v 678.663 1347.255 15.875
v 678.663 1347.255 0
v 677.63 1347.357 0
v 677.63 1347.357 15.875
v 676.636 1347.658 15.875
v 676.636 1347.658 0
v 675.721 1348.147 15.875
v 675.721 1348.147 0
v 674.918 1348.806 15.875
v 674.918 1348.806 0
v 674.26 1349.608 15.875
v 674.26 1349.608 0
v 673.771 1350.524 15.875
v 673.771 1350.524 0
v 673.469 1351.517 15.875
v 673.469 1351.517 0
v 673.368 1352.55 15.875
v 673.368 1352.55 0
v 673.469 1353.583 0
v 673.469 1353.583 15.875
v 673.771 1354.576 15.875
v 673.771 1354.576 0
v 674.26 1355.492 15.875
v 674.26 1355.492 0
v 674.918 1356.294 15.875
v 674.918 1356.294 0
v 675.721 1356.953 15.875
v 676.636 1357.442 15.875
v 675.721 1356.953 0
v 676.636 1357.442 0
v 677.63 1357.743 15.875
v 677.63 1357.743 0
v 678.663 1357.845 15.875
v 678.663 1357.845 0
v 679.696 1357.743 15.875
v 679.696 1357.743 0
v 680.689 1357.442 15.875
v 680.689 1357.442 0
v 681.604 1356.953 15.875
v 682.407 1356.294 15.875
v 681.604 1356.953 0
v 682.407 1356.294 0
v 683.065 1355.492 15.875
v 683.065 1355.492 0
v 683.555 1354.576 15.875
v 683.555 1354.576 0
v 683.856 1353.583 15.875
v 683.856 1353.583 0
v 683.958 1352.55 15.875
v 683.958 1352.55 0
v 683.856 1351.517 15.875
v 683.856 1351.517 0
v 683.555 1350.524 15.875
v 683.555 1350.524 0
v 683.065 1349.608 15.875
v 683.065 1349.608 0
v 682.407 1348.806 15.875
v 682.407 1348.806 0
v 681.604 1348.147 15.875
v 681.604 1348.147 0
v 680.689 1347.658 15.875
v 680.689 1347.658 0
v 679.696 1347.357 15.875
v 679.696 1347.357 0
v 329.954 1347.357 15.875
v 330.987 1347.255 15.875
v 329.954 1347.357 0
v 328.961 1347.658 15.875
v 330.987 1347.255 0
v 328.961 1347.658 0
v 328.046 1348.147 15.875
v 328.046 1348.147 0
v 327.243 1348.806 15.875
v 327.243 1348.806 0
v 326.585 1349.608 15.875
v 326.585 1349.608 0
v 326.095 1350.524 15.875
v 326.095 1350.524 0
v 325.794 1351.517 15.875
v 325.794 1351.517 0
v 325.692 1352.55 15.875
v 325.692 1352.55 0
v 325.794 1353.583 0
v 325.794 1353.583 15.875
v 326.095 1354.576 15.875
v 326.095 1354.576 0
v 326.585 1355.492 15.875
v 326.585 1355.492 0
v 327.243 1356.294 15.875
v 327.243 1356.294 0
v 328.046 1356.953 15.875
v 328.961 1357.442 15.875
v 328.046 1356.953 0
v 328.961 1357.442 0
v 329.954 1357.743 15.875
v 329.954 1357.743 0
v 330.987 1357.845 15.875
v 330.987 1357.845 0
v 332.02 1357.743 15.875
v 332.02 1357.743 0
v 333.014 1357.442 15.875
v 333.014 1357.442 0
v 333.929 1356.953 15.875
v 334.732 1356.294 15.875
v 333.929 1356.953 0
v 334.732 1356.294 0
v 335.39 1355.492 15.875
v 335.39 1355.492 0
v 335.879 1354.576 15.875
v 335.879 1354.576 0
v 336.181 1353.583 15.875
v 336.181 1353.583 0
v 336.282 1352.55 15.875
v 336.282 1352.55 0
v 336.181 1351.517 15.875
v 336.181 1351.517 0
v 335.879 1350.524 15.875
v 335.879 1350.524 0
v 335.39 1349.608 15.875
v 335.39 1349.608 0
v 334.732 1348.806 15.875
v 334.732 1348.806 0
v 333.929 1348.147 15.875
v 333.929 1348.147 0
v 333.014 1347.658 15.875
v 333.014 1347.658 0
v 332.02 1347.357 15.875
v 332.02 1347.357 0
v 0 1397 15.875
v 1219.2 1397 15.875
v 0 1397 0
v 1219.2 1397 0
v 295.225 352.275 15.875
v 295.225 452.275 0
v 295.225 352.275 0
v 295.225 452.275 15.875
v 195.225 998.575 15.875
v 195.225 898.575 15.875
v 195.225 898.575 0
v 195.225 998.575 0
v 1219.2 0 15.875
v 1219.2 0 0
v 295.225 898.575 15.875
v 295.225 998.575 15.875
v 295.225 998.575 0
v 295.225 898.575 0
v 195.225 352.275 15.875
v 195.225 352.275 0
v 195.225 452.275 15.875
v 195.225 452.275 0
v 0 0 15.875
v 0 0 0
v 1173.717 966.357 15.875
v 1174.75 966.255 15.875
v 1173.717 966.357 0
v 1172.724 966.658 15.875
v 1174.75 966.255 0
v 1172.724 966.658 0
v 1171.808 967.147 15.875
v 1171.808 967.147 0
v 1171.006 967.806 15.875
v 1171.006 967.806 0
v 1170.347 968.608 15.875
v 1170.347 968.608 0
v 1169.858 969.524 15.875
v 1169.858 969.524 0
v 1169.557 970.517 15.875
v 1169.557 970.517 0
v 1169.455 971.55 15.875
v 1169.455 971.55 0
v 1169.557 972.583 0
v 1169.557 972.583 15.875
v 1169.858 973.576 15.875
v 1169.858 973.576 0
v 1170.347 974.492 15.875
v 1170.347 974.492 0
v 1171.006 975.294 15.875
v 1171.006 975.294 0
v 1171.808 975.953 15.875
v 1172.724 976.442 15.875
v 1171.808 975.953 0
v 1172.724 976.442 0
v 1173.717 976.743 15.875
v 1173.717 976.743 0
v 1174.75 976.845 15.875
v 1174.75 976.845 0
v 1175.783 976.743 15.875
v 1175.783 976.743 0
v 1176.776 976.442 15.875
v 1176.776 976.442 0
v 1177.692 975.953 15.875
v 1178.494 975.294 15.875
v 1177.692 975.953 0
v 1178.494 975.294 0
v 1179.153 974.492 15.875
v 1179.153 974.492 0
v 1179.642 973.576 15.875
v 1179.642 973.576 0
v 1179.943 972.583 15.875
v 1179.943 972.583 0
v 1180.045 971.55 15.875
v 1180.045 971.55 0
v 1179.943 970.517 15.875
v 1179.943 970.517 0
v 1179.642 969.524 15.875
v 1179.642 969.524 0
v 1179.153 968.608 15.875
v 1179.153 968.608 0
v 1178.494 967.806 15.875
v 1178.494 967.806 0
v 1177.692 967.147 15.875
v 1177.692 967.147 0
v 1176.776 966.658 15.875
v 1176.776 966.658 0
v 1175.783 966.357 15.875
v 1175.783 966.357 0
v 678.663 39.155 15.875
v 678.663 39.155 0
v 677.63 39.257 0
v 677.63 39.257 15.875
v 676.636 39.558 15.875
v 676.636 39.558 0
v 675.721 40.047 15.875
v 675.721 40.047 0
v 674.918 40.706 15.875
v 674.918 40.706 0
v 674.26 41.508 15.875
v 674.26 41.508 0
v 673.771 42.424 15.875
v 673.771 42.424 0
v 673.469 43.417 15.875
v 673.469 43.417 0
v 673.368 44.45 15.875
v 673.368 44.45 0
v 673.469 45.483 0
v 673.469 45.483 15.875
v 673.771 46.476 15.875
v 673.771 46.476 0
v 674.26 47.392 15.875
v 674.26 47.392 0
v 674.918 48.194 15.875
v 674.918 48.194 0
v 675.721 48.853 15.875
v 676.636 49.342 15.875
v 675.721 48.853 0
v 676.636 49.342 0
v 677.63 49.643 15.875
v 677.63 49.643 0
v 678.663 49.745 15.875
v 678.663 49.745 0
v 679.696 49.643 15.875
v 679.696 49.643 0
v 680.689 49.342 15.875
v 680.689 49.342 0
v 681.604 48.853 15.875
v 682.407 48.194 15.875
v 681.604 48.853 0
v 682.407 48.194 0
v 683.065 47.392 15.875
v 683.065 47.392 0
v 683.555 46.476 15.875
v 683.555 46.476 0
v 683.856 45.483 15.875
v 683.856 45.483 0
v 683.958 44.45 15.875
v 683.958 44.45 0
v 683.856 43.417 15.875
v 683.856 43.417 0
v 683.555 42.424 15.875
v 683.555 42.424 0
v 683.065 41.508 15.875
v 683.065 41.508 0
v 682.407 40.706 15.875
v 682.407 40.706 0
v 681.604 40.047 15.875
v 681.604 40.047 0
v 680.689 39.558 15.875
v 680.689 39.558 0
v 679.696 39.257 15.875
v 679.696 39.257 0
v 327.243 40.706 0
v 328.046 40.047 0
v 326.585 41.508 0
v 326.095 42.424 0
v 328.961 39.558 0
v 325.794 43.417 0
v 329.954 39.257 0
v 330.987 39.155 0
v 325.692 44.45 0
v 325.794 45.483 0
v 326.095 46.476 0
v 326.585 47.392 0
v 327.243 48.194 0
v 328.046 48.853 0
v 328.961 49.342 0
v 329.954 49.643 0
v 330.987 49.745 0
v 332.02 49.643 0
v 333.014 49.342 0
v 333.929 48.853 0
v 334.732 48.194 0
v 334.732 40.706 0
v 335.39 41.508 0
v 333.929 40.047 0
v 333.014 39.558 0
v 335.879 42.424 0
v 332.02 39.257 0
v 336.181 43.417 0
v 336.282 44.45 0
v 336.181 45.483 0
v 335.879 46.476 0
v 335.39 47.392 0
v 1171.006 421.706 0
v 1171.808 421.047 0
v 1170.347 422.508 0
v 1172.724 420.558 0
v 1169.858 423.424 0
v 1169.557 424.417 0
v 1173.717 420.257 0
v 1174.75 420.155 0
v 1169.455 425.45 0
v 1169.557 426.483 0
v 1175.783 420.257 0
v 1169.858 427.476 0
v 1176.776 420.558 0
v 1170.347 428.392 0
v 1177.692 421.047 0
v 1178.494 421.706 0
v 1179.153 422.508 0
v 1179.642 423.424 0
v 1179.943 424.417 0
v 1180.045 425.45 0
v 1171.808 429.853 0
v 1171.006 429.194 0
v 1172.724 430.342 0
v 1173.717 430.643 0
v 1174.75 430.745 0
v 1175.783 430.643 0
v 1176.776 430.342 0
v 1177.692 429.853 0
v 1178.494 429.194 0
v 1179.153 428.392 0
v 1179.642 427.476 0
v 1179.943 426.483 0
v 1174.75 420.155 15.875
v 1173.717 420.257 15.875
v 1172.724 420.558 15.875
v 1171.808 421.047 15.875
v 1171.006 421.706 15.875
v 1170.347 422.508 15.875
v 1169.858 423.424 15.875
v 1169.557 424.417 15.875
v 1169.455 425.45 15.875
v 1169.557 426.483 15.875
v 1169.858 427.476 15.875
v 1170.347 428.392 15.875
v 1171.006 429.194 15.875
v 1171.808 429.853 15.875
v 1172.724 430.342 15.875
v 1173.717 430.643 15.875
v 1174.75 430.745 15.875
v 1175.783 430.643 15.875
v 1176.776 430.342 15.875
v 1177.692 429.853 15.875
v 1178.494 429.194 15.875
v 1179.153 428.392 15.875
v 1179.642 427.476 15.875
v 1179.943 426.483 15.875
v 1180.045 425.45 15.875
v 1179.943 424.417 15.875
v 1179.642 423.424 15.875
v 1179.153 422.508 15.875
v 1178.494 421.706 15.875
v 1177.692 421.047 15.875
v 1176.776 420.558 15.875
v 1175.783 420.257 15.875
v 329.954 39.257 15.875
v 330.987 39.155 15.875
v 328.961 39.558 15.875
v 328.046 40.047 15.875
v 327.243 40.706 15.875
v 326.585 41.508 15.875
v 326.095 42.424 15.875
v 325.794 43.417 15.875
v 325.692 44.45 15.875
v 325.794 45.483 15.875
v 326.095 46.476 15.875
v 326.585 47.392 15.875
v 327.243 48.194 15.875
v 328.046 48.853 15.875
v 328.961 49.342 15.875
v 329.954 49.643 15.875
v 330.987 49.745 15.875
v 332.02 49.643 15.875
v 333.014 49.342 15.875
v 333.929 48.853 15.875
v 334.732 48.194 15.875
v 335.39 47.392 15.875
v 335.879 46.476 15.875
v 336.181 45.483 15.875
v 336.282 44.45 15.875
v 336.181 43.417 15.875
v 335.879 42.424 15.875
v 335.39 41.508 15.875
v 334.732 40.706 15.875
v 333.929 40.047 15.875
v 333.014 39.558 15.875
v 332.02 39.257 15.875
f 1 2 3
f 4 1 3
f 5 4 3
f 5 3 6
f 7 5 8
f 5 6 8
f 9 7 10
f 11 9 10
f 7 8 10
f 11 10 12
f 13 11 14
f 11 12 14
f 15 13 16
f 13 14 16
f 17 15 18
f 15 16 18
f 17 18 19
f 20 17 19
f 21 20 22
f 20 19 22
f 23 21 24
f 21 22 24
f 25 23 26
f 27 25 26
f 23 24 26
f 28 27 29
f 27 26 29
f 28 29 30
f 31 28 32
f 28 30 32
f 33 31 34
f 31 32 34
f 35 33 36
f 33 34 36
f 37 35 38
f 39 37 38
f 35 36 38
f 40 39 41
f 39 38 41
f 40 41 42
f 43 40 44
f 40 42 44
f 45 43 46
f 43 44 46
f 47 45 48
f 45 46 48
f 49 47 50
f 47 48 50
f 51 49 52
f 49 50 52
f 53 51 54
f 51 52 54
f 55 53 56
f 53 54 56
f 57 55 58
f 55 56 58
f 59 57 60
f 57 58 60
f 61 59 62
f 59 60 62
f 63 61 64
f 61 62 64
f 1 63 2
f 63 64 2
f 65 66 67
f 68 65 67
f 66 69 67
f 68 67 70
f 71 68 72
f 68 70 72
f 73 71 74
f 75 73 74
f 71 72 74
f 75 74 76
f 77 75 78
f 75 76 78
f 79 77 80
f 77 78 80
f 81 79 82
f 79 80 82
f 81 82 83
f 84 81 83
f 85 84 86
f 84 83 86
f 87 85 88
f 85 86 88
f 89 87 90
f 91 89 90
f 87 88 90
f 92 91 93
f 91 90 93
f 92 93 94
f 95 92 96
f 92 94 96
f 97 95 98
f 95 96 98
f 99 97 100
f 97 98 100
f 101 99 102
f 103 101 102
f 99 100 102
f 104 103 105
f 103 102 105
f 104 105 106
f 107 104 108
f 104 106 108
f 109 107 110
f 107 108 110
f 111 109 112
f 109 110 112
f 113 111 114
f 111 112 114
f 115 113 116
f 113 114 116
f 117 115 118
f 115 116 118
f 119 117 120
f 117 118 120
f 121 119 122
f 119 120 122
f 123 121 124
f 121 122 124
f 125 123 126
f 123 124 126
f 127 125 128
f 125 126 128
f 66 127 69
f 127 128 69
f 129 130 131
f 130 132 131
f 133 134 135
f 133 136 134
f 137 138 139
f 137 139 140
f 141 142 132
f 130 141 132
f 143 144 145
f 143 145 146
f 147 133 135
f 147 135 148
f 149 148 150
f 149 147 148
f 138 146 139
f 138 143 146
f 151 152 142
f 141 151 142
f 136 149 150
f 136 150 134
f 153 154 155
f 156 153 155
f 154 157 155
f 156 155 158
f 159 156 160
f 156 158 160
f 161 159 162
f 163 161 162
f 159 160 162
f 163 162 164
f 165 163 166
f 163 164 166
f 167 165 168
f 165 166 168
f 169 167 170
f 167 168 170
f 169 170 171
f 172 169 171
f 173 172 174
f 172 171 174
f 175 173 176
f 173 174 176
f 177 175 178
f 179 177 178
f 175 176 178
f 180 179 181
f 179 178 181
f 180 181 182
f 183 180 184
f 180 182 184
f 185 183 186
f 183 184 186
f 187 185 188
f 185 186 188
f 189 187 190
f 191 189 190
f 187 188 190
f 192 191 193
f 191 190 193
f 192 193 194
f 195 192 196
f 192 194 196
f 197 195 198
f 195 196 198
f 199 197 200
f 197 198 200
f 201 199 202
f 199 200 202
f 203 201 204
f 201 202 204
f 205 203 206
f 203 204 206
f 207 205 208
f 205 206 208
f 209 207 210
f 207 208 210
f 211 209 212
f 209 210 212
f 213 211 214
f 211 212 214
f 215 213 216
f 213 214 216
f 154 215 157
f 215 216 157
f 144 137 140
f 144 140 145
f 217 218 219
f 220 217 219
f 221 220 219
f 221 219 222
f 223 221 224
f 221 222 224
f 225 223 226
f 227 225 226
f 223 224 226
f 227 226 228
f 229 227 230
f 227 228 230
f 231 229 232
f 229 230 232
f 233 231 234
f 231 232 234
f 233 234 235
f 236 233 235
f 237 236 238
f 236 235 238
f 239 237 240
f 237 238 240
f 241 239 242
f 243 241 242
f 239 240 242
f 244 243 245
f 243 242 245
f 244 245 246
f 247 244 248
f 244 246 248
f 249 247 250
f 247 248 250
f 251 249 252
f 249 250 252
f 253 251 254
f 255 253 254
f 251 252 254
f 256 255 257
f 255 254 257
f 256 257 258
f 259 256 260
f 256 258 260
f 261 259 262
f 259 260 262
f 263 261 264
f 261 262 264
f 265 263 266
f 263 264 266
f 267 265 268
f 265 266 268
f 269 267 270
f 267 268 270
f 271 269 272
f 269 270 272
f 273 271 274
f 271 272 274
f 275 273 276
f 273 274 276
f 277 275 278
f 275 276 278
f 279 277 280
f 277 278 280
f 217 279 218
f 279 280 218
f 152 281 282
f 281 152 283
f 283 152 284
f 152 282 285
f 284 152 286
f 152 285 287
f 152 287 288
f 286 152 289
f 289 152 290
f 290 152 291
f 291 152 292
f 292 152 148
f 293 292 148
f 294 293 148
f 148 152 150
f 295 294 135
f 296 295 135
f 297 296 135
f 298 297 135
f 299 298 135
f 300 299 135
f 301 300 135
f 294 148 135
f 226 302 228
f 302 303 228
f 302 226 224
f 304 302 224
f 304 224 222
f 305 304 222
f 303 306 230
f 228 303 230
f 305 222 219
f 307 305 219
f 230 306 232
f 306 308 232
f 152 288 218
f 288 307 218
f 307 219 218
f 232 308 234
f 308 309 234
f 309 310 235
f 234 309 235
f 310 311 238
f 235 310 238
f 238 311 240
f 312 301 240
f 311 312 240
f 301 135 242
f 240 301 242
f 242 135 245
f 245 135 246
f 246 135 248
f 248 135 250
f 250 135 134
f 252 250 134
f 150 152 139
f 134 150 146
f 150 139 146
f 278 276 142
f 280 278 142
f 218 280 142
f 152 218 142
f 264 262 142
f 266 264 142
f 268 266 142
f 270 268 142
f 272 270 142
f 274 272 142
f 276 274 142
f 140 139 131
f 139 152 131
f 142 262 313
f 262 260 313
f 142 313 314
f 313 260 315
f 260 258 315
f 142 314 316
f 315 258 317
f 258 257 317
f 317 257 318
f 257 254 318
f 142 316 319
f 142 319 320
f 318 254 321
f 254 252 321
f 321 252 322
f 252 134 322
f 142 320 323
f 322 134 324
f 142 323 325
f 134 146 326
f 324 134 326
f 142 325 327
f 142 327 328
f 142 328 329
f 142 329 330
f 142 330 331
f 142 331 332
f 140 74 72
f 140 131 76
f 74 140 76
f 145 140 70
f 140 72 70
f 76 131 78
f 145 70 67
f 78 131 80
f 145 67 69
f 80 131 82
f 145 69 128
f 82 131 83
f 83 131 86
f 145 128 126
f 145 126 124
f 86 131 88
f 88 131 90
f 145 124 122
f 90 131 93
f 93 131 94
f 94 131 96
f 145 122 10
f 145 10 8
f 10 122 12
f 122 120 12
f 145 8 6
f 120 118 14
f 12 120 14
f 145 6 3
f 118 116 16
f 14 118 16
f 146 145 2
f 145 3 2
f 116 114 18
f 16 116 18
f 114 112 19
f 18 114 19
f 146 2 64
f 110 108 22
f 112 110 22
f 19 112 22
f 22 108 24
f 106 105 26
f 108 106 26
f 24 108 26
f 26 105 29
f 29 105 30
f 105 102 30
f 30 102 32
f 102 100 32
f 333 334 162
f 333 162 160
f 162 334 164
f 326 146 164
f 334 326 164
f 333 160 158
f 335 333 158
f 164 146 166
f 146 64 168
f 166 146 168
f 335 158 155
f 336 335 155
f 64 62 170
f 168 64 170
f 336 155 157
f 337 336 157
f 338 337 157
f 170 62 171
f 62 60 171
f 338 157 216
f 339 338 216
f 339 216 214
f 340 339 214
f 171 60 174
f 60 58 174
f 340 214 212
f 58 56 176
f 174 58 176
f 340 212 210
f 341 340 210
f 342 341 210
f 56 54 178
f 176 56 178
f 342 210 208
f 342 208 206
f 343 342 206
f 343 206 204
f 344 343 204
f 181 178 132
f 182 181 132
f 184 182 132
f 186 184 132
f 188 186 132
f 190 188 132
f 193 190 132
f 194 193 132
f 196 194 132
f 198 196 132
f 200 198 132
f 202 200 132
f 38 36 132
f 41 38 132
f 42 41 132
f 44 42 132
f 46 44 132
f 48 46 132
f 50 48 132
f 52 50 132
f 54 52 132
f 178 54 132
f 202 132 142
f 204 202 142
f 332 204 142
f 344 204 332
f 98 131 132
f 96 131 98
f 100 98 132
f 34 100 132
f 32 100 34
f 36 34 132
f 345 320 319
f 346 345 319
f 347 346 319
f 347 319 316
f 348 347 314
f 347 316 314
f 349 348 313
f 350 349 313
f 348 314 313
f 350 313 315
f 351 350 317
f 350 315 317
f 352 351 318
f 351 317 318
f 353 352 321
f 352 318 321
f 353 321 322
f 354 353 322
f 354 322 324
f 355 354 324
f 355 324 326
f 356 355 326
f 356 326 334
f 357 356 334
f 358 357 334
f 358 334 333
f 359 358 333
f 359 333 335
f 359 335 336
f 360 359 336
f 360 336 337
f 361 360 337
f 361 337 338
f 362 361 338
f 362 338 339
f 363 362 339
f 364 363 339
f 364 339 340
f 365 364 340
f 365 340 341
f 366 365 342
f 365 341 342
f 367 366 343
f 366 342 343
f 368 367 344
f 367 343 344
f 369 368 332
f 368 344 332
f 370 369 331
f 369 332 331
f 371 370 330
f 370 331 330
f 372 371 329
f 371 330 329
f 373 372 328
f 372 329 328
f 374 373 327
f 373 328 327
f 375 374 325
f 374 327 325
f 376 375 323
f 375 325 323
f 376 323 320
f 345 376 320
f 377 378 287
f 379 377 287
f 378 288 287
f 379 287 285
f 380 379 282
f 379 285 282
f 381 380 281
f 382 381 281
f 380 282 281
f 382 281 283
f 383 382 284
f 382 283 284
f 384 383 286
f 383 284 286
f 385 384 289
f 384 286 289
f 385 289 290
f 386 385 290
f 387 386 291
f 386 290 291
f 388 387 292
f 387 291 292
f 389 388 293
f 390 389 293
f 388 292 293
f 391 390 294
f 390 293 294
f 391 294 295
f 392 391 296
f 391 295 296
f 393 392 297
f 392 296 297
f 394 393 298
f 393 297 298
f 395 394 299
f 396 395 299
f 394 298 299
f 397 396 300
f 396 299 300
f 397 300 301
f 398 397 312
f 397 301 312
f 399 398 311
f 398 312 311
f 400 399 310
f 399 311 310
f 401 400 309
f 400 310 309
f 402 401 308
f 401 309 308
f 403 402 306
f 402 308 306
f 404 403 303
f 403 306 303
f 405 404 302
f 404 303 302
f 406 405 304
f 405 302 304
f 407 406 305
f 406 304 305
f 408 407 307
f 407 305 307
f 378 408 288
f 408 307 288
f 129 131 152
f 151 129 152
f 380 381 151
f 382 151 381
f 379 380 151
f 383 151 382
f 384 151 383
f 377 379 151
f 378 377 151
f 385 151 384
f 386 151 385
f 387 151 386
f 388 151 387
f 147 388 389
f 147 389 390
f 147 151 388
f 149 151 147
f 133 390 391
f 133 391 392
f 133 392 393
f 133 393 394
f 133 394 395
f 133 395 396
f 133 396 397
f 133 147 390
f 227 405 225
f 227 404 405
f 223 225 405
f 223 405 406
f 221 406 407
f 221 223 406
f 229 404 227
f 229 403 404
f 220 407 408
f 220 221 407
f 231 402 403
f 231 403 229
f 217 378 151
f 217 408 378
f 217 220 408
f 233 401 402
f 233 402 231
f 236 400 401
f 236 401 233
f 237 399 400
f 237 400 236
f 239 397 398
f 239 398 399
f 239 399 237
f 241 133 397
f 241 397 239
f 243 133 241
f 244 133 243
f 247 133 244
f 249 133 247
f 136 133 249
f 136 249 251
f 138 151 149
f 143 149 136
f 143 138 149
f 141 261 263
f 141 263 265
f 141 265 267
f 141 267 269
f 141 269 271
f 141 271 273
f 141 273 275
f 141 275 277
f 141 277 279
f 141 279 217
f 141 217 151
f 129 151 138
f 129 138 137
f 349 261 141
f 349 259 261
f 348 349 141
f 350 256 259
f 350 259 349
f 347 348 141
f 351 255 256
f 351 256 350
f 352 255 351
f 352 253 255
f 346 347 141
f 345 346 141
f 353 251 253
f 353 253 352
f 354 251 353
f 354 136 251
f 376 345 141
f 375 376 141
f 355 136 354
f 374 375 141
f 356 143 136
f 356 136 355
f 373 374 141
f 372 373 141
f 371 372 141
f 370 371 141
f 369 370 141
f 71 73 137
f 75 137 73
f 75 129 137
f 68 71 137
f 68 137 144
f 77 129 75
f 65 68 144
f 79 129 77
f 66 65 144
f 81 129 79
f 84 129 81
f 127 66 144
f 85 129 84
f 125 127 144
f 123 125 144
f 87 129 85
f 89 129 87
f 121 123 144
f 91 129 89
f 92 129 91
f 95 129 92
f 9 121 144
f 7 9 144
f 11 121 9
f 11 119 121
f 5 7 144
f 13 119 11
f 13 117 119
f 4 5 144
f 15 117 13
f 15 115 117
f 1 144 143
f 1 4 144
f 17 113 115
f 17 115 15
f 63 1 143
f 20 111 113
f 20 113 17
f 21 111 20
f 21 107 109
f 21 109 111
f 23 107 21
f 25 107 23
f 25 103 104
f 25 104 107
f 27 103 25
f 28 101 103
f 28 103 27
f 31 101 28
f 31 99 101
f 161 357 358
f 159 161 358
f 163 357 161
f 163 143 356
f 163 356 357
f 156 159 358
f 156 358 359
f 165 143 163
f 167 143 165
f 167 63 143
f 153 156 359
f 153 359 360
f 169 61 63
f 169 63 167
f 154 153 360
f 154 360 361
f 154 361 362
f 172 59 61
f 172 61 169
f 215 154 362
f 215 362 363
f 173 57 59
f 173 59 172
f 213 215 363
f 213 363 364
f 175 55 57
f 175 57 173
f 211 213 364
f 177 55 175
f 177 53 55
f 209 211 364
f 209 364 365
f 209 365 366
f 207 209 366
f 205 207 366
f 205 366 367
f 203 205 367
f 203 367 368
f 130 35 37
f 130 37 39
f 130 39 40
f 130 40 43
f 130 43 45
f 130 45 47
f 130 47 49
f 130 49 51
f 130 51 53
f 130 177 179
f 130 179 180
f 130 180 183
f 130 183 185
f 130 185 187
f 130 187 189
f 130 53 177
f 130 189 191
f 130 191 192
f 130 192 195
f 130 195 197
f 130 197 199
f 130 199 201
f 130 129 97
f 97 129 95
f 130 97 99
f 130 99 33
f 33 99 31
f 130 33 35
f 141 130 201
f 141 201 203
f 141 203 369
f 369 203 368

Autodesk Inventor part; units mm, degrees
ref_plane "YZ Plane" through (0, 0, 0) normal (1, 0, 0) x (0, 1, 0)
ref_plane "XZ Plane" through (0, 0, 0) normal (0, 1, 0) x (-1, 0, 0)
ref_plane "XY Plane" through (0, 0, 0) normal (0, 0, 1) x (1, 0, 0)
sketch "Sketch1" plane through (0, 0, 0) normal (0, 0, 1) x (1, 0, 0)
  line L0 (0, 0) -> (1219.2, 0)
  line L1 (1219.2, 0) -> (1219.2, 1397)
  line L2 (1219.2, 1397) -> (0, 1397)
  line L3 (0, 1397) -> (0, 0)
  dimension "d0" = 1219.2
  dimension "d1" = 1397
extrude "Extrusion1" add sketch "Sketch1" along normal blind 15.875
sketch "Sketch8" plane through (0, 0, 15.875) normal (0, 0, 1) x (1, 0, 0)
  line L0 (1219.2, 0) -> (1219.2, 1397) projected
  point P0 (330.9874, 1352.55)
  point P1 (678.6626, 1352.55)
  point P2 (1174.75, 971.55)
  point P3 (1174.75, 425.45)
  point P4 (678.6626, 44.45)
  point P5 (330.9874, 44.45)
  point P6 (330.9874, 1352.55)
  point P7 (678.6626, 1352.55)
  point P8 (1174.75, 971.55)
  point P9 (1174.75, 425.45)
  point P10 (678.6626, 44.45)
  point P11 (330.9874, 44.45)
hole "Hole4" at (330.9874, 1352.55, 15.875) at (678.6626, 1352.55, 15.875) at (1174.75, 971.55, 15.875) at (1174.75, 425.45, 15.875) at (678.6626, 44.45, 15.875) at (330.9874, 44.45, 15.875) direction (0, 0, -1) diameter 10.59 end through all thread size "1/2-13 UNC" class "2B" standard "ANSI Unified Screw Threads"
sketch "Sketch14" plane through (0, 0, 15.875) normal (0, 0, 1) x (1, 0, 0)
  line L0 (1219.2, 0) -> (1219.2, 1397) projected
  line L1 (1219.2, 0) -> (1219.2, 88.9)
  line L2 (1219.2, 88.9) -> (1130.3, 88.9)
  line L3 (1130.3, 88.9) -> (1130.3, 104.775)
  line L4 (1130.3, 104.775) -> (1114.425, 104.775)
  line L5 (1114.425, 104.775) -> (245.225, 104.775)
  line L6 (245.225, 104.775) -> (245.225, 402.275)
  line L7 (295.225, 352.275) -> (195.225, 352.275)
  line L8 (195.225, 352.275) -> (195.225, 452.275)
  line L9 (195.225, 452.275) -> (295.225, 452.275)
  line L10 (295.225, 452.275) -> (295.225, 352.275)
  line L11 (295.225, 352.275) -> (195.225, 452.275) construction
  line L12 (195.225, 352.275) -> (295.225, 452.275) construction
  line L13 (245.225, 104.775) -> (245.225, 948.575)
  line L14 (295.225, 898.575) -> (195.225, 898.575)
  line L15 (195.225, 898.575) -> (195.225, 998.575)
  line L16 (195.225, 998.575) -> (295.225, 998.575)
  line L17 (295.225, 998.575) -> (295.225, 898.575)
  line L18 (295.225, 898.575) -> (195.225, 998.575) construction
  line L19 (195.225, 898.575) -> (295.225, 998.575) construction
  dimension "d80" = 88.9
  dimension "d81" = 88.9
  dimension "d82" = 15.875
  dimension "d83" = 15.875
  dimension "d84" = 869.2
  dimension "d85" = 297.5
  dimension "d86" = 100
  dimension "d87" = 100
  dimension "d88" = 843.8
  dimension "d89" = 100
  dimension "d90" = 100
extrude "Extrusion5" cut sketch "Sketch14" against normal blind 15.875
properties part number "model 2 comp 2 floor part 2"
